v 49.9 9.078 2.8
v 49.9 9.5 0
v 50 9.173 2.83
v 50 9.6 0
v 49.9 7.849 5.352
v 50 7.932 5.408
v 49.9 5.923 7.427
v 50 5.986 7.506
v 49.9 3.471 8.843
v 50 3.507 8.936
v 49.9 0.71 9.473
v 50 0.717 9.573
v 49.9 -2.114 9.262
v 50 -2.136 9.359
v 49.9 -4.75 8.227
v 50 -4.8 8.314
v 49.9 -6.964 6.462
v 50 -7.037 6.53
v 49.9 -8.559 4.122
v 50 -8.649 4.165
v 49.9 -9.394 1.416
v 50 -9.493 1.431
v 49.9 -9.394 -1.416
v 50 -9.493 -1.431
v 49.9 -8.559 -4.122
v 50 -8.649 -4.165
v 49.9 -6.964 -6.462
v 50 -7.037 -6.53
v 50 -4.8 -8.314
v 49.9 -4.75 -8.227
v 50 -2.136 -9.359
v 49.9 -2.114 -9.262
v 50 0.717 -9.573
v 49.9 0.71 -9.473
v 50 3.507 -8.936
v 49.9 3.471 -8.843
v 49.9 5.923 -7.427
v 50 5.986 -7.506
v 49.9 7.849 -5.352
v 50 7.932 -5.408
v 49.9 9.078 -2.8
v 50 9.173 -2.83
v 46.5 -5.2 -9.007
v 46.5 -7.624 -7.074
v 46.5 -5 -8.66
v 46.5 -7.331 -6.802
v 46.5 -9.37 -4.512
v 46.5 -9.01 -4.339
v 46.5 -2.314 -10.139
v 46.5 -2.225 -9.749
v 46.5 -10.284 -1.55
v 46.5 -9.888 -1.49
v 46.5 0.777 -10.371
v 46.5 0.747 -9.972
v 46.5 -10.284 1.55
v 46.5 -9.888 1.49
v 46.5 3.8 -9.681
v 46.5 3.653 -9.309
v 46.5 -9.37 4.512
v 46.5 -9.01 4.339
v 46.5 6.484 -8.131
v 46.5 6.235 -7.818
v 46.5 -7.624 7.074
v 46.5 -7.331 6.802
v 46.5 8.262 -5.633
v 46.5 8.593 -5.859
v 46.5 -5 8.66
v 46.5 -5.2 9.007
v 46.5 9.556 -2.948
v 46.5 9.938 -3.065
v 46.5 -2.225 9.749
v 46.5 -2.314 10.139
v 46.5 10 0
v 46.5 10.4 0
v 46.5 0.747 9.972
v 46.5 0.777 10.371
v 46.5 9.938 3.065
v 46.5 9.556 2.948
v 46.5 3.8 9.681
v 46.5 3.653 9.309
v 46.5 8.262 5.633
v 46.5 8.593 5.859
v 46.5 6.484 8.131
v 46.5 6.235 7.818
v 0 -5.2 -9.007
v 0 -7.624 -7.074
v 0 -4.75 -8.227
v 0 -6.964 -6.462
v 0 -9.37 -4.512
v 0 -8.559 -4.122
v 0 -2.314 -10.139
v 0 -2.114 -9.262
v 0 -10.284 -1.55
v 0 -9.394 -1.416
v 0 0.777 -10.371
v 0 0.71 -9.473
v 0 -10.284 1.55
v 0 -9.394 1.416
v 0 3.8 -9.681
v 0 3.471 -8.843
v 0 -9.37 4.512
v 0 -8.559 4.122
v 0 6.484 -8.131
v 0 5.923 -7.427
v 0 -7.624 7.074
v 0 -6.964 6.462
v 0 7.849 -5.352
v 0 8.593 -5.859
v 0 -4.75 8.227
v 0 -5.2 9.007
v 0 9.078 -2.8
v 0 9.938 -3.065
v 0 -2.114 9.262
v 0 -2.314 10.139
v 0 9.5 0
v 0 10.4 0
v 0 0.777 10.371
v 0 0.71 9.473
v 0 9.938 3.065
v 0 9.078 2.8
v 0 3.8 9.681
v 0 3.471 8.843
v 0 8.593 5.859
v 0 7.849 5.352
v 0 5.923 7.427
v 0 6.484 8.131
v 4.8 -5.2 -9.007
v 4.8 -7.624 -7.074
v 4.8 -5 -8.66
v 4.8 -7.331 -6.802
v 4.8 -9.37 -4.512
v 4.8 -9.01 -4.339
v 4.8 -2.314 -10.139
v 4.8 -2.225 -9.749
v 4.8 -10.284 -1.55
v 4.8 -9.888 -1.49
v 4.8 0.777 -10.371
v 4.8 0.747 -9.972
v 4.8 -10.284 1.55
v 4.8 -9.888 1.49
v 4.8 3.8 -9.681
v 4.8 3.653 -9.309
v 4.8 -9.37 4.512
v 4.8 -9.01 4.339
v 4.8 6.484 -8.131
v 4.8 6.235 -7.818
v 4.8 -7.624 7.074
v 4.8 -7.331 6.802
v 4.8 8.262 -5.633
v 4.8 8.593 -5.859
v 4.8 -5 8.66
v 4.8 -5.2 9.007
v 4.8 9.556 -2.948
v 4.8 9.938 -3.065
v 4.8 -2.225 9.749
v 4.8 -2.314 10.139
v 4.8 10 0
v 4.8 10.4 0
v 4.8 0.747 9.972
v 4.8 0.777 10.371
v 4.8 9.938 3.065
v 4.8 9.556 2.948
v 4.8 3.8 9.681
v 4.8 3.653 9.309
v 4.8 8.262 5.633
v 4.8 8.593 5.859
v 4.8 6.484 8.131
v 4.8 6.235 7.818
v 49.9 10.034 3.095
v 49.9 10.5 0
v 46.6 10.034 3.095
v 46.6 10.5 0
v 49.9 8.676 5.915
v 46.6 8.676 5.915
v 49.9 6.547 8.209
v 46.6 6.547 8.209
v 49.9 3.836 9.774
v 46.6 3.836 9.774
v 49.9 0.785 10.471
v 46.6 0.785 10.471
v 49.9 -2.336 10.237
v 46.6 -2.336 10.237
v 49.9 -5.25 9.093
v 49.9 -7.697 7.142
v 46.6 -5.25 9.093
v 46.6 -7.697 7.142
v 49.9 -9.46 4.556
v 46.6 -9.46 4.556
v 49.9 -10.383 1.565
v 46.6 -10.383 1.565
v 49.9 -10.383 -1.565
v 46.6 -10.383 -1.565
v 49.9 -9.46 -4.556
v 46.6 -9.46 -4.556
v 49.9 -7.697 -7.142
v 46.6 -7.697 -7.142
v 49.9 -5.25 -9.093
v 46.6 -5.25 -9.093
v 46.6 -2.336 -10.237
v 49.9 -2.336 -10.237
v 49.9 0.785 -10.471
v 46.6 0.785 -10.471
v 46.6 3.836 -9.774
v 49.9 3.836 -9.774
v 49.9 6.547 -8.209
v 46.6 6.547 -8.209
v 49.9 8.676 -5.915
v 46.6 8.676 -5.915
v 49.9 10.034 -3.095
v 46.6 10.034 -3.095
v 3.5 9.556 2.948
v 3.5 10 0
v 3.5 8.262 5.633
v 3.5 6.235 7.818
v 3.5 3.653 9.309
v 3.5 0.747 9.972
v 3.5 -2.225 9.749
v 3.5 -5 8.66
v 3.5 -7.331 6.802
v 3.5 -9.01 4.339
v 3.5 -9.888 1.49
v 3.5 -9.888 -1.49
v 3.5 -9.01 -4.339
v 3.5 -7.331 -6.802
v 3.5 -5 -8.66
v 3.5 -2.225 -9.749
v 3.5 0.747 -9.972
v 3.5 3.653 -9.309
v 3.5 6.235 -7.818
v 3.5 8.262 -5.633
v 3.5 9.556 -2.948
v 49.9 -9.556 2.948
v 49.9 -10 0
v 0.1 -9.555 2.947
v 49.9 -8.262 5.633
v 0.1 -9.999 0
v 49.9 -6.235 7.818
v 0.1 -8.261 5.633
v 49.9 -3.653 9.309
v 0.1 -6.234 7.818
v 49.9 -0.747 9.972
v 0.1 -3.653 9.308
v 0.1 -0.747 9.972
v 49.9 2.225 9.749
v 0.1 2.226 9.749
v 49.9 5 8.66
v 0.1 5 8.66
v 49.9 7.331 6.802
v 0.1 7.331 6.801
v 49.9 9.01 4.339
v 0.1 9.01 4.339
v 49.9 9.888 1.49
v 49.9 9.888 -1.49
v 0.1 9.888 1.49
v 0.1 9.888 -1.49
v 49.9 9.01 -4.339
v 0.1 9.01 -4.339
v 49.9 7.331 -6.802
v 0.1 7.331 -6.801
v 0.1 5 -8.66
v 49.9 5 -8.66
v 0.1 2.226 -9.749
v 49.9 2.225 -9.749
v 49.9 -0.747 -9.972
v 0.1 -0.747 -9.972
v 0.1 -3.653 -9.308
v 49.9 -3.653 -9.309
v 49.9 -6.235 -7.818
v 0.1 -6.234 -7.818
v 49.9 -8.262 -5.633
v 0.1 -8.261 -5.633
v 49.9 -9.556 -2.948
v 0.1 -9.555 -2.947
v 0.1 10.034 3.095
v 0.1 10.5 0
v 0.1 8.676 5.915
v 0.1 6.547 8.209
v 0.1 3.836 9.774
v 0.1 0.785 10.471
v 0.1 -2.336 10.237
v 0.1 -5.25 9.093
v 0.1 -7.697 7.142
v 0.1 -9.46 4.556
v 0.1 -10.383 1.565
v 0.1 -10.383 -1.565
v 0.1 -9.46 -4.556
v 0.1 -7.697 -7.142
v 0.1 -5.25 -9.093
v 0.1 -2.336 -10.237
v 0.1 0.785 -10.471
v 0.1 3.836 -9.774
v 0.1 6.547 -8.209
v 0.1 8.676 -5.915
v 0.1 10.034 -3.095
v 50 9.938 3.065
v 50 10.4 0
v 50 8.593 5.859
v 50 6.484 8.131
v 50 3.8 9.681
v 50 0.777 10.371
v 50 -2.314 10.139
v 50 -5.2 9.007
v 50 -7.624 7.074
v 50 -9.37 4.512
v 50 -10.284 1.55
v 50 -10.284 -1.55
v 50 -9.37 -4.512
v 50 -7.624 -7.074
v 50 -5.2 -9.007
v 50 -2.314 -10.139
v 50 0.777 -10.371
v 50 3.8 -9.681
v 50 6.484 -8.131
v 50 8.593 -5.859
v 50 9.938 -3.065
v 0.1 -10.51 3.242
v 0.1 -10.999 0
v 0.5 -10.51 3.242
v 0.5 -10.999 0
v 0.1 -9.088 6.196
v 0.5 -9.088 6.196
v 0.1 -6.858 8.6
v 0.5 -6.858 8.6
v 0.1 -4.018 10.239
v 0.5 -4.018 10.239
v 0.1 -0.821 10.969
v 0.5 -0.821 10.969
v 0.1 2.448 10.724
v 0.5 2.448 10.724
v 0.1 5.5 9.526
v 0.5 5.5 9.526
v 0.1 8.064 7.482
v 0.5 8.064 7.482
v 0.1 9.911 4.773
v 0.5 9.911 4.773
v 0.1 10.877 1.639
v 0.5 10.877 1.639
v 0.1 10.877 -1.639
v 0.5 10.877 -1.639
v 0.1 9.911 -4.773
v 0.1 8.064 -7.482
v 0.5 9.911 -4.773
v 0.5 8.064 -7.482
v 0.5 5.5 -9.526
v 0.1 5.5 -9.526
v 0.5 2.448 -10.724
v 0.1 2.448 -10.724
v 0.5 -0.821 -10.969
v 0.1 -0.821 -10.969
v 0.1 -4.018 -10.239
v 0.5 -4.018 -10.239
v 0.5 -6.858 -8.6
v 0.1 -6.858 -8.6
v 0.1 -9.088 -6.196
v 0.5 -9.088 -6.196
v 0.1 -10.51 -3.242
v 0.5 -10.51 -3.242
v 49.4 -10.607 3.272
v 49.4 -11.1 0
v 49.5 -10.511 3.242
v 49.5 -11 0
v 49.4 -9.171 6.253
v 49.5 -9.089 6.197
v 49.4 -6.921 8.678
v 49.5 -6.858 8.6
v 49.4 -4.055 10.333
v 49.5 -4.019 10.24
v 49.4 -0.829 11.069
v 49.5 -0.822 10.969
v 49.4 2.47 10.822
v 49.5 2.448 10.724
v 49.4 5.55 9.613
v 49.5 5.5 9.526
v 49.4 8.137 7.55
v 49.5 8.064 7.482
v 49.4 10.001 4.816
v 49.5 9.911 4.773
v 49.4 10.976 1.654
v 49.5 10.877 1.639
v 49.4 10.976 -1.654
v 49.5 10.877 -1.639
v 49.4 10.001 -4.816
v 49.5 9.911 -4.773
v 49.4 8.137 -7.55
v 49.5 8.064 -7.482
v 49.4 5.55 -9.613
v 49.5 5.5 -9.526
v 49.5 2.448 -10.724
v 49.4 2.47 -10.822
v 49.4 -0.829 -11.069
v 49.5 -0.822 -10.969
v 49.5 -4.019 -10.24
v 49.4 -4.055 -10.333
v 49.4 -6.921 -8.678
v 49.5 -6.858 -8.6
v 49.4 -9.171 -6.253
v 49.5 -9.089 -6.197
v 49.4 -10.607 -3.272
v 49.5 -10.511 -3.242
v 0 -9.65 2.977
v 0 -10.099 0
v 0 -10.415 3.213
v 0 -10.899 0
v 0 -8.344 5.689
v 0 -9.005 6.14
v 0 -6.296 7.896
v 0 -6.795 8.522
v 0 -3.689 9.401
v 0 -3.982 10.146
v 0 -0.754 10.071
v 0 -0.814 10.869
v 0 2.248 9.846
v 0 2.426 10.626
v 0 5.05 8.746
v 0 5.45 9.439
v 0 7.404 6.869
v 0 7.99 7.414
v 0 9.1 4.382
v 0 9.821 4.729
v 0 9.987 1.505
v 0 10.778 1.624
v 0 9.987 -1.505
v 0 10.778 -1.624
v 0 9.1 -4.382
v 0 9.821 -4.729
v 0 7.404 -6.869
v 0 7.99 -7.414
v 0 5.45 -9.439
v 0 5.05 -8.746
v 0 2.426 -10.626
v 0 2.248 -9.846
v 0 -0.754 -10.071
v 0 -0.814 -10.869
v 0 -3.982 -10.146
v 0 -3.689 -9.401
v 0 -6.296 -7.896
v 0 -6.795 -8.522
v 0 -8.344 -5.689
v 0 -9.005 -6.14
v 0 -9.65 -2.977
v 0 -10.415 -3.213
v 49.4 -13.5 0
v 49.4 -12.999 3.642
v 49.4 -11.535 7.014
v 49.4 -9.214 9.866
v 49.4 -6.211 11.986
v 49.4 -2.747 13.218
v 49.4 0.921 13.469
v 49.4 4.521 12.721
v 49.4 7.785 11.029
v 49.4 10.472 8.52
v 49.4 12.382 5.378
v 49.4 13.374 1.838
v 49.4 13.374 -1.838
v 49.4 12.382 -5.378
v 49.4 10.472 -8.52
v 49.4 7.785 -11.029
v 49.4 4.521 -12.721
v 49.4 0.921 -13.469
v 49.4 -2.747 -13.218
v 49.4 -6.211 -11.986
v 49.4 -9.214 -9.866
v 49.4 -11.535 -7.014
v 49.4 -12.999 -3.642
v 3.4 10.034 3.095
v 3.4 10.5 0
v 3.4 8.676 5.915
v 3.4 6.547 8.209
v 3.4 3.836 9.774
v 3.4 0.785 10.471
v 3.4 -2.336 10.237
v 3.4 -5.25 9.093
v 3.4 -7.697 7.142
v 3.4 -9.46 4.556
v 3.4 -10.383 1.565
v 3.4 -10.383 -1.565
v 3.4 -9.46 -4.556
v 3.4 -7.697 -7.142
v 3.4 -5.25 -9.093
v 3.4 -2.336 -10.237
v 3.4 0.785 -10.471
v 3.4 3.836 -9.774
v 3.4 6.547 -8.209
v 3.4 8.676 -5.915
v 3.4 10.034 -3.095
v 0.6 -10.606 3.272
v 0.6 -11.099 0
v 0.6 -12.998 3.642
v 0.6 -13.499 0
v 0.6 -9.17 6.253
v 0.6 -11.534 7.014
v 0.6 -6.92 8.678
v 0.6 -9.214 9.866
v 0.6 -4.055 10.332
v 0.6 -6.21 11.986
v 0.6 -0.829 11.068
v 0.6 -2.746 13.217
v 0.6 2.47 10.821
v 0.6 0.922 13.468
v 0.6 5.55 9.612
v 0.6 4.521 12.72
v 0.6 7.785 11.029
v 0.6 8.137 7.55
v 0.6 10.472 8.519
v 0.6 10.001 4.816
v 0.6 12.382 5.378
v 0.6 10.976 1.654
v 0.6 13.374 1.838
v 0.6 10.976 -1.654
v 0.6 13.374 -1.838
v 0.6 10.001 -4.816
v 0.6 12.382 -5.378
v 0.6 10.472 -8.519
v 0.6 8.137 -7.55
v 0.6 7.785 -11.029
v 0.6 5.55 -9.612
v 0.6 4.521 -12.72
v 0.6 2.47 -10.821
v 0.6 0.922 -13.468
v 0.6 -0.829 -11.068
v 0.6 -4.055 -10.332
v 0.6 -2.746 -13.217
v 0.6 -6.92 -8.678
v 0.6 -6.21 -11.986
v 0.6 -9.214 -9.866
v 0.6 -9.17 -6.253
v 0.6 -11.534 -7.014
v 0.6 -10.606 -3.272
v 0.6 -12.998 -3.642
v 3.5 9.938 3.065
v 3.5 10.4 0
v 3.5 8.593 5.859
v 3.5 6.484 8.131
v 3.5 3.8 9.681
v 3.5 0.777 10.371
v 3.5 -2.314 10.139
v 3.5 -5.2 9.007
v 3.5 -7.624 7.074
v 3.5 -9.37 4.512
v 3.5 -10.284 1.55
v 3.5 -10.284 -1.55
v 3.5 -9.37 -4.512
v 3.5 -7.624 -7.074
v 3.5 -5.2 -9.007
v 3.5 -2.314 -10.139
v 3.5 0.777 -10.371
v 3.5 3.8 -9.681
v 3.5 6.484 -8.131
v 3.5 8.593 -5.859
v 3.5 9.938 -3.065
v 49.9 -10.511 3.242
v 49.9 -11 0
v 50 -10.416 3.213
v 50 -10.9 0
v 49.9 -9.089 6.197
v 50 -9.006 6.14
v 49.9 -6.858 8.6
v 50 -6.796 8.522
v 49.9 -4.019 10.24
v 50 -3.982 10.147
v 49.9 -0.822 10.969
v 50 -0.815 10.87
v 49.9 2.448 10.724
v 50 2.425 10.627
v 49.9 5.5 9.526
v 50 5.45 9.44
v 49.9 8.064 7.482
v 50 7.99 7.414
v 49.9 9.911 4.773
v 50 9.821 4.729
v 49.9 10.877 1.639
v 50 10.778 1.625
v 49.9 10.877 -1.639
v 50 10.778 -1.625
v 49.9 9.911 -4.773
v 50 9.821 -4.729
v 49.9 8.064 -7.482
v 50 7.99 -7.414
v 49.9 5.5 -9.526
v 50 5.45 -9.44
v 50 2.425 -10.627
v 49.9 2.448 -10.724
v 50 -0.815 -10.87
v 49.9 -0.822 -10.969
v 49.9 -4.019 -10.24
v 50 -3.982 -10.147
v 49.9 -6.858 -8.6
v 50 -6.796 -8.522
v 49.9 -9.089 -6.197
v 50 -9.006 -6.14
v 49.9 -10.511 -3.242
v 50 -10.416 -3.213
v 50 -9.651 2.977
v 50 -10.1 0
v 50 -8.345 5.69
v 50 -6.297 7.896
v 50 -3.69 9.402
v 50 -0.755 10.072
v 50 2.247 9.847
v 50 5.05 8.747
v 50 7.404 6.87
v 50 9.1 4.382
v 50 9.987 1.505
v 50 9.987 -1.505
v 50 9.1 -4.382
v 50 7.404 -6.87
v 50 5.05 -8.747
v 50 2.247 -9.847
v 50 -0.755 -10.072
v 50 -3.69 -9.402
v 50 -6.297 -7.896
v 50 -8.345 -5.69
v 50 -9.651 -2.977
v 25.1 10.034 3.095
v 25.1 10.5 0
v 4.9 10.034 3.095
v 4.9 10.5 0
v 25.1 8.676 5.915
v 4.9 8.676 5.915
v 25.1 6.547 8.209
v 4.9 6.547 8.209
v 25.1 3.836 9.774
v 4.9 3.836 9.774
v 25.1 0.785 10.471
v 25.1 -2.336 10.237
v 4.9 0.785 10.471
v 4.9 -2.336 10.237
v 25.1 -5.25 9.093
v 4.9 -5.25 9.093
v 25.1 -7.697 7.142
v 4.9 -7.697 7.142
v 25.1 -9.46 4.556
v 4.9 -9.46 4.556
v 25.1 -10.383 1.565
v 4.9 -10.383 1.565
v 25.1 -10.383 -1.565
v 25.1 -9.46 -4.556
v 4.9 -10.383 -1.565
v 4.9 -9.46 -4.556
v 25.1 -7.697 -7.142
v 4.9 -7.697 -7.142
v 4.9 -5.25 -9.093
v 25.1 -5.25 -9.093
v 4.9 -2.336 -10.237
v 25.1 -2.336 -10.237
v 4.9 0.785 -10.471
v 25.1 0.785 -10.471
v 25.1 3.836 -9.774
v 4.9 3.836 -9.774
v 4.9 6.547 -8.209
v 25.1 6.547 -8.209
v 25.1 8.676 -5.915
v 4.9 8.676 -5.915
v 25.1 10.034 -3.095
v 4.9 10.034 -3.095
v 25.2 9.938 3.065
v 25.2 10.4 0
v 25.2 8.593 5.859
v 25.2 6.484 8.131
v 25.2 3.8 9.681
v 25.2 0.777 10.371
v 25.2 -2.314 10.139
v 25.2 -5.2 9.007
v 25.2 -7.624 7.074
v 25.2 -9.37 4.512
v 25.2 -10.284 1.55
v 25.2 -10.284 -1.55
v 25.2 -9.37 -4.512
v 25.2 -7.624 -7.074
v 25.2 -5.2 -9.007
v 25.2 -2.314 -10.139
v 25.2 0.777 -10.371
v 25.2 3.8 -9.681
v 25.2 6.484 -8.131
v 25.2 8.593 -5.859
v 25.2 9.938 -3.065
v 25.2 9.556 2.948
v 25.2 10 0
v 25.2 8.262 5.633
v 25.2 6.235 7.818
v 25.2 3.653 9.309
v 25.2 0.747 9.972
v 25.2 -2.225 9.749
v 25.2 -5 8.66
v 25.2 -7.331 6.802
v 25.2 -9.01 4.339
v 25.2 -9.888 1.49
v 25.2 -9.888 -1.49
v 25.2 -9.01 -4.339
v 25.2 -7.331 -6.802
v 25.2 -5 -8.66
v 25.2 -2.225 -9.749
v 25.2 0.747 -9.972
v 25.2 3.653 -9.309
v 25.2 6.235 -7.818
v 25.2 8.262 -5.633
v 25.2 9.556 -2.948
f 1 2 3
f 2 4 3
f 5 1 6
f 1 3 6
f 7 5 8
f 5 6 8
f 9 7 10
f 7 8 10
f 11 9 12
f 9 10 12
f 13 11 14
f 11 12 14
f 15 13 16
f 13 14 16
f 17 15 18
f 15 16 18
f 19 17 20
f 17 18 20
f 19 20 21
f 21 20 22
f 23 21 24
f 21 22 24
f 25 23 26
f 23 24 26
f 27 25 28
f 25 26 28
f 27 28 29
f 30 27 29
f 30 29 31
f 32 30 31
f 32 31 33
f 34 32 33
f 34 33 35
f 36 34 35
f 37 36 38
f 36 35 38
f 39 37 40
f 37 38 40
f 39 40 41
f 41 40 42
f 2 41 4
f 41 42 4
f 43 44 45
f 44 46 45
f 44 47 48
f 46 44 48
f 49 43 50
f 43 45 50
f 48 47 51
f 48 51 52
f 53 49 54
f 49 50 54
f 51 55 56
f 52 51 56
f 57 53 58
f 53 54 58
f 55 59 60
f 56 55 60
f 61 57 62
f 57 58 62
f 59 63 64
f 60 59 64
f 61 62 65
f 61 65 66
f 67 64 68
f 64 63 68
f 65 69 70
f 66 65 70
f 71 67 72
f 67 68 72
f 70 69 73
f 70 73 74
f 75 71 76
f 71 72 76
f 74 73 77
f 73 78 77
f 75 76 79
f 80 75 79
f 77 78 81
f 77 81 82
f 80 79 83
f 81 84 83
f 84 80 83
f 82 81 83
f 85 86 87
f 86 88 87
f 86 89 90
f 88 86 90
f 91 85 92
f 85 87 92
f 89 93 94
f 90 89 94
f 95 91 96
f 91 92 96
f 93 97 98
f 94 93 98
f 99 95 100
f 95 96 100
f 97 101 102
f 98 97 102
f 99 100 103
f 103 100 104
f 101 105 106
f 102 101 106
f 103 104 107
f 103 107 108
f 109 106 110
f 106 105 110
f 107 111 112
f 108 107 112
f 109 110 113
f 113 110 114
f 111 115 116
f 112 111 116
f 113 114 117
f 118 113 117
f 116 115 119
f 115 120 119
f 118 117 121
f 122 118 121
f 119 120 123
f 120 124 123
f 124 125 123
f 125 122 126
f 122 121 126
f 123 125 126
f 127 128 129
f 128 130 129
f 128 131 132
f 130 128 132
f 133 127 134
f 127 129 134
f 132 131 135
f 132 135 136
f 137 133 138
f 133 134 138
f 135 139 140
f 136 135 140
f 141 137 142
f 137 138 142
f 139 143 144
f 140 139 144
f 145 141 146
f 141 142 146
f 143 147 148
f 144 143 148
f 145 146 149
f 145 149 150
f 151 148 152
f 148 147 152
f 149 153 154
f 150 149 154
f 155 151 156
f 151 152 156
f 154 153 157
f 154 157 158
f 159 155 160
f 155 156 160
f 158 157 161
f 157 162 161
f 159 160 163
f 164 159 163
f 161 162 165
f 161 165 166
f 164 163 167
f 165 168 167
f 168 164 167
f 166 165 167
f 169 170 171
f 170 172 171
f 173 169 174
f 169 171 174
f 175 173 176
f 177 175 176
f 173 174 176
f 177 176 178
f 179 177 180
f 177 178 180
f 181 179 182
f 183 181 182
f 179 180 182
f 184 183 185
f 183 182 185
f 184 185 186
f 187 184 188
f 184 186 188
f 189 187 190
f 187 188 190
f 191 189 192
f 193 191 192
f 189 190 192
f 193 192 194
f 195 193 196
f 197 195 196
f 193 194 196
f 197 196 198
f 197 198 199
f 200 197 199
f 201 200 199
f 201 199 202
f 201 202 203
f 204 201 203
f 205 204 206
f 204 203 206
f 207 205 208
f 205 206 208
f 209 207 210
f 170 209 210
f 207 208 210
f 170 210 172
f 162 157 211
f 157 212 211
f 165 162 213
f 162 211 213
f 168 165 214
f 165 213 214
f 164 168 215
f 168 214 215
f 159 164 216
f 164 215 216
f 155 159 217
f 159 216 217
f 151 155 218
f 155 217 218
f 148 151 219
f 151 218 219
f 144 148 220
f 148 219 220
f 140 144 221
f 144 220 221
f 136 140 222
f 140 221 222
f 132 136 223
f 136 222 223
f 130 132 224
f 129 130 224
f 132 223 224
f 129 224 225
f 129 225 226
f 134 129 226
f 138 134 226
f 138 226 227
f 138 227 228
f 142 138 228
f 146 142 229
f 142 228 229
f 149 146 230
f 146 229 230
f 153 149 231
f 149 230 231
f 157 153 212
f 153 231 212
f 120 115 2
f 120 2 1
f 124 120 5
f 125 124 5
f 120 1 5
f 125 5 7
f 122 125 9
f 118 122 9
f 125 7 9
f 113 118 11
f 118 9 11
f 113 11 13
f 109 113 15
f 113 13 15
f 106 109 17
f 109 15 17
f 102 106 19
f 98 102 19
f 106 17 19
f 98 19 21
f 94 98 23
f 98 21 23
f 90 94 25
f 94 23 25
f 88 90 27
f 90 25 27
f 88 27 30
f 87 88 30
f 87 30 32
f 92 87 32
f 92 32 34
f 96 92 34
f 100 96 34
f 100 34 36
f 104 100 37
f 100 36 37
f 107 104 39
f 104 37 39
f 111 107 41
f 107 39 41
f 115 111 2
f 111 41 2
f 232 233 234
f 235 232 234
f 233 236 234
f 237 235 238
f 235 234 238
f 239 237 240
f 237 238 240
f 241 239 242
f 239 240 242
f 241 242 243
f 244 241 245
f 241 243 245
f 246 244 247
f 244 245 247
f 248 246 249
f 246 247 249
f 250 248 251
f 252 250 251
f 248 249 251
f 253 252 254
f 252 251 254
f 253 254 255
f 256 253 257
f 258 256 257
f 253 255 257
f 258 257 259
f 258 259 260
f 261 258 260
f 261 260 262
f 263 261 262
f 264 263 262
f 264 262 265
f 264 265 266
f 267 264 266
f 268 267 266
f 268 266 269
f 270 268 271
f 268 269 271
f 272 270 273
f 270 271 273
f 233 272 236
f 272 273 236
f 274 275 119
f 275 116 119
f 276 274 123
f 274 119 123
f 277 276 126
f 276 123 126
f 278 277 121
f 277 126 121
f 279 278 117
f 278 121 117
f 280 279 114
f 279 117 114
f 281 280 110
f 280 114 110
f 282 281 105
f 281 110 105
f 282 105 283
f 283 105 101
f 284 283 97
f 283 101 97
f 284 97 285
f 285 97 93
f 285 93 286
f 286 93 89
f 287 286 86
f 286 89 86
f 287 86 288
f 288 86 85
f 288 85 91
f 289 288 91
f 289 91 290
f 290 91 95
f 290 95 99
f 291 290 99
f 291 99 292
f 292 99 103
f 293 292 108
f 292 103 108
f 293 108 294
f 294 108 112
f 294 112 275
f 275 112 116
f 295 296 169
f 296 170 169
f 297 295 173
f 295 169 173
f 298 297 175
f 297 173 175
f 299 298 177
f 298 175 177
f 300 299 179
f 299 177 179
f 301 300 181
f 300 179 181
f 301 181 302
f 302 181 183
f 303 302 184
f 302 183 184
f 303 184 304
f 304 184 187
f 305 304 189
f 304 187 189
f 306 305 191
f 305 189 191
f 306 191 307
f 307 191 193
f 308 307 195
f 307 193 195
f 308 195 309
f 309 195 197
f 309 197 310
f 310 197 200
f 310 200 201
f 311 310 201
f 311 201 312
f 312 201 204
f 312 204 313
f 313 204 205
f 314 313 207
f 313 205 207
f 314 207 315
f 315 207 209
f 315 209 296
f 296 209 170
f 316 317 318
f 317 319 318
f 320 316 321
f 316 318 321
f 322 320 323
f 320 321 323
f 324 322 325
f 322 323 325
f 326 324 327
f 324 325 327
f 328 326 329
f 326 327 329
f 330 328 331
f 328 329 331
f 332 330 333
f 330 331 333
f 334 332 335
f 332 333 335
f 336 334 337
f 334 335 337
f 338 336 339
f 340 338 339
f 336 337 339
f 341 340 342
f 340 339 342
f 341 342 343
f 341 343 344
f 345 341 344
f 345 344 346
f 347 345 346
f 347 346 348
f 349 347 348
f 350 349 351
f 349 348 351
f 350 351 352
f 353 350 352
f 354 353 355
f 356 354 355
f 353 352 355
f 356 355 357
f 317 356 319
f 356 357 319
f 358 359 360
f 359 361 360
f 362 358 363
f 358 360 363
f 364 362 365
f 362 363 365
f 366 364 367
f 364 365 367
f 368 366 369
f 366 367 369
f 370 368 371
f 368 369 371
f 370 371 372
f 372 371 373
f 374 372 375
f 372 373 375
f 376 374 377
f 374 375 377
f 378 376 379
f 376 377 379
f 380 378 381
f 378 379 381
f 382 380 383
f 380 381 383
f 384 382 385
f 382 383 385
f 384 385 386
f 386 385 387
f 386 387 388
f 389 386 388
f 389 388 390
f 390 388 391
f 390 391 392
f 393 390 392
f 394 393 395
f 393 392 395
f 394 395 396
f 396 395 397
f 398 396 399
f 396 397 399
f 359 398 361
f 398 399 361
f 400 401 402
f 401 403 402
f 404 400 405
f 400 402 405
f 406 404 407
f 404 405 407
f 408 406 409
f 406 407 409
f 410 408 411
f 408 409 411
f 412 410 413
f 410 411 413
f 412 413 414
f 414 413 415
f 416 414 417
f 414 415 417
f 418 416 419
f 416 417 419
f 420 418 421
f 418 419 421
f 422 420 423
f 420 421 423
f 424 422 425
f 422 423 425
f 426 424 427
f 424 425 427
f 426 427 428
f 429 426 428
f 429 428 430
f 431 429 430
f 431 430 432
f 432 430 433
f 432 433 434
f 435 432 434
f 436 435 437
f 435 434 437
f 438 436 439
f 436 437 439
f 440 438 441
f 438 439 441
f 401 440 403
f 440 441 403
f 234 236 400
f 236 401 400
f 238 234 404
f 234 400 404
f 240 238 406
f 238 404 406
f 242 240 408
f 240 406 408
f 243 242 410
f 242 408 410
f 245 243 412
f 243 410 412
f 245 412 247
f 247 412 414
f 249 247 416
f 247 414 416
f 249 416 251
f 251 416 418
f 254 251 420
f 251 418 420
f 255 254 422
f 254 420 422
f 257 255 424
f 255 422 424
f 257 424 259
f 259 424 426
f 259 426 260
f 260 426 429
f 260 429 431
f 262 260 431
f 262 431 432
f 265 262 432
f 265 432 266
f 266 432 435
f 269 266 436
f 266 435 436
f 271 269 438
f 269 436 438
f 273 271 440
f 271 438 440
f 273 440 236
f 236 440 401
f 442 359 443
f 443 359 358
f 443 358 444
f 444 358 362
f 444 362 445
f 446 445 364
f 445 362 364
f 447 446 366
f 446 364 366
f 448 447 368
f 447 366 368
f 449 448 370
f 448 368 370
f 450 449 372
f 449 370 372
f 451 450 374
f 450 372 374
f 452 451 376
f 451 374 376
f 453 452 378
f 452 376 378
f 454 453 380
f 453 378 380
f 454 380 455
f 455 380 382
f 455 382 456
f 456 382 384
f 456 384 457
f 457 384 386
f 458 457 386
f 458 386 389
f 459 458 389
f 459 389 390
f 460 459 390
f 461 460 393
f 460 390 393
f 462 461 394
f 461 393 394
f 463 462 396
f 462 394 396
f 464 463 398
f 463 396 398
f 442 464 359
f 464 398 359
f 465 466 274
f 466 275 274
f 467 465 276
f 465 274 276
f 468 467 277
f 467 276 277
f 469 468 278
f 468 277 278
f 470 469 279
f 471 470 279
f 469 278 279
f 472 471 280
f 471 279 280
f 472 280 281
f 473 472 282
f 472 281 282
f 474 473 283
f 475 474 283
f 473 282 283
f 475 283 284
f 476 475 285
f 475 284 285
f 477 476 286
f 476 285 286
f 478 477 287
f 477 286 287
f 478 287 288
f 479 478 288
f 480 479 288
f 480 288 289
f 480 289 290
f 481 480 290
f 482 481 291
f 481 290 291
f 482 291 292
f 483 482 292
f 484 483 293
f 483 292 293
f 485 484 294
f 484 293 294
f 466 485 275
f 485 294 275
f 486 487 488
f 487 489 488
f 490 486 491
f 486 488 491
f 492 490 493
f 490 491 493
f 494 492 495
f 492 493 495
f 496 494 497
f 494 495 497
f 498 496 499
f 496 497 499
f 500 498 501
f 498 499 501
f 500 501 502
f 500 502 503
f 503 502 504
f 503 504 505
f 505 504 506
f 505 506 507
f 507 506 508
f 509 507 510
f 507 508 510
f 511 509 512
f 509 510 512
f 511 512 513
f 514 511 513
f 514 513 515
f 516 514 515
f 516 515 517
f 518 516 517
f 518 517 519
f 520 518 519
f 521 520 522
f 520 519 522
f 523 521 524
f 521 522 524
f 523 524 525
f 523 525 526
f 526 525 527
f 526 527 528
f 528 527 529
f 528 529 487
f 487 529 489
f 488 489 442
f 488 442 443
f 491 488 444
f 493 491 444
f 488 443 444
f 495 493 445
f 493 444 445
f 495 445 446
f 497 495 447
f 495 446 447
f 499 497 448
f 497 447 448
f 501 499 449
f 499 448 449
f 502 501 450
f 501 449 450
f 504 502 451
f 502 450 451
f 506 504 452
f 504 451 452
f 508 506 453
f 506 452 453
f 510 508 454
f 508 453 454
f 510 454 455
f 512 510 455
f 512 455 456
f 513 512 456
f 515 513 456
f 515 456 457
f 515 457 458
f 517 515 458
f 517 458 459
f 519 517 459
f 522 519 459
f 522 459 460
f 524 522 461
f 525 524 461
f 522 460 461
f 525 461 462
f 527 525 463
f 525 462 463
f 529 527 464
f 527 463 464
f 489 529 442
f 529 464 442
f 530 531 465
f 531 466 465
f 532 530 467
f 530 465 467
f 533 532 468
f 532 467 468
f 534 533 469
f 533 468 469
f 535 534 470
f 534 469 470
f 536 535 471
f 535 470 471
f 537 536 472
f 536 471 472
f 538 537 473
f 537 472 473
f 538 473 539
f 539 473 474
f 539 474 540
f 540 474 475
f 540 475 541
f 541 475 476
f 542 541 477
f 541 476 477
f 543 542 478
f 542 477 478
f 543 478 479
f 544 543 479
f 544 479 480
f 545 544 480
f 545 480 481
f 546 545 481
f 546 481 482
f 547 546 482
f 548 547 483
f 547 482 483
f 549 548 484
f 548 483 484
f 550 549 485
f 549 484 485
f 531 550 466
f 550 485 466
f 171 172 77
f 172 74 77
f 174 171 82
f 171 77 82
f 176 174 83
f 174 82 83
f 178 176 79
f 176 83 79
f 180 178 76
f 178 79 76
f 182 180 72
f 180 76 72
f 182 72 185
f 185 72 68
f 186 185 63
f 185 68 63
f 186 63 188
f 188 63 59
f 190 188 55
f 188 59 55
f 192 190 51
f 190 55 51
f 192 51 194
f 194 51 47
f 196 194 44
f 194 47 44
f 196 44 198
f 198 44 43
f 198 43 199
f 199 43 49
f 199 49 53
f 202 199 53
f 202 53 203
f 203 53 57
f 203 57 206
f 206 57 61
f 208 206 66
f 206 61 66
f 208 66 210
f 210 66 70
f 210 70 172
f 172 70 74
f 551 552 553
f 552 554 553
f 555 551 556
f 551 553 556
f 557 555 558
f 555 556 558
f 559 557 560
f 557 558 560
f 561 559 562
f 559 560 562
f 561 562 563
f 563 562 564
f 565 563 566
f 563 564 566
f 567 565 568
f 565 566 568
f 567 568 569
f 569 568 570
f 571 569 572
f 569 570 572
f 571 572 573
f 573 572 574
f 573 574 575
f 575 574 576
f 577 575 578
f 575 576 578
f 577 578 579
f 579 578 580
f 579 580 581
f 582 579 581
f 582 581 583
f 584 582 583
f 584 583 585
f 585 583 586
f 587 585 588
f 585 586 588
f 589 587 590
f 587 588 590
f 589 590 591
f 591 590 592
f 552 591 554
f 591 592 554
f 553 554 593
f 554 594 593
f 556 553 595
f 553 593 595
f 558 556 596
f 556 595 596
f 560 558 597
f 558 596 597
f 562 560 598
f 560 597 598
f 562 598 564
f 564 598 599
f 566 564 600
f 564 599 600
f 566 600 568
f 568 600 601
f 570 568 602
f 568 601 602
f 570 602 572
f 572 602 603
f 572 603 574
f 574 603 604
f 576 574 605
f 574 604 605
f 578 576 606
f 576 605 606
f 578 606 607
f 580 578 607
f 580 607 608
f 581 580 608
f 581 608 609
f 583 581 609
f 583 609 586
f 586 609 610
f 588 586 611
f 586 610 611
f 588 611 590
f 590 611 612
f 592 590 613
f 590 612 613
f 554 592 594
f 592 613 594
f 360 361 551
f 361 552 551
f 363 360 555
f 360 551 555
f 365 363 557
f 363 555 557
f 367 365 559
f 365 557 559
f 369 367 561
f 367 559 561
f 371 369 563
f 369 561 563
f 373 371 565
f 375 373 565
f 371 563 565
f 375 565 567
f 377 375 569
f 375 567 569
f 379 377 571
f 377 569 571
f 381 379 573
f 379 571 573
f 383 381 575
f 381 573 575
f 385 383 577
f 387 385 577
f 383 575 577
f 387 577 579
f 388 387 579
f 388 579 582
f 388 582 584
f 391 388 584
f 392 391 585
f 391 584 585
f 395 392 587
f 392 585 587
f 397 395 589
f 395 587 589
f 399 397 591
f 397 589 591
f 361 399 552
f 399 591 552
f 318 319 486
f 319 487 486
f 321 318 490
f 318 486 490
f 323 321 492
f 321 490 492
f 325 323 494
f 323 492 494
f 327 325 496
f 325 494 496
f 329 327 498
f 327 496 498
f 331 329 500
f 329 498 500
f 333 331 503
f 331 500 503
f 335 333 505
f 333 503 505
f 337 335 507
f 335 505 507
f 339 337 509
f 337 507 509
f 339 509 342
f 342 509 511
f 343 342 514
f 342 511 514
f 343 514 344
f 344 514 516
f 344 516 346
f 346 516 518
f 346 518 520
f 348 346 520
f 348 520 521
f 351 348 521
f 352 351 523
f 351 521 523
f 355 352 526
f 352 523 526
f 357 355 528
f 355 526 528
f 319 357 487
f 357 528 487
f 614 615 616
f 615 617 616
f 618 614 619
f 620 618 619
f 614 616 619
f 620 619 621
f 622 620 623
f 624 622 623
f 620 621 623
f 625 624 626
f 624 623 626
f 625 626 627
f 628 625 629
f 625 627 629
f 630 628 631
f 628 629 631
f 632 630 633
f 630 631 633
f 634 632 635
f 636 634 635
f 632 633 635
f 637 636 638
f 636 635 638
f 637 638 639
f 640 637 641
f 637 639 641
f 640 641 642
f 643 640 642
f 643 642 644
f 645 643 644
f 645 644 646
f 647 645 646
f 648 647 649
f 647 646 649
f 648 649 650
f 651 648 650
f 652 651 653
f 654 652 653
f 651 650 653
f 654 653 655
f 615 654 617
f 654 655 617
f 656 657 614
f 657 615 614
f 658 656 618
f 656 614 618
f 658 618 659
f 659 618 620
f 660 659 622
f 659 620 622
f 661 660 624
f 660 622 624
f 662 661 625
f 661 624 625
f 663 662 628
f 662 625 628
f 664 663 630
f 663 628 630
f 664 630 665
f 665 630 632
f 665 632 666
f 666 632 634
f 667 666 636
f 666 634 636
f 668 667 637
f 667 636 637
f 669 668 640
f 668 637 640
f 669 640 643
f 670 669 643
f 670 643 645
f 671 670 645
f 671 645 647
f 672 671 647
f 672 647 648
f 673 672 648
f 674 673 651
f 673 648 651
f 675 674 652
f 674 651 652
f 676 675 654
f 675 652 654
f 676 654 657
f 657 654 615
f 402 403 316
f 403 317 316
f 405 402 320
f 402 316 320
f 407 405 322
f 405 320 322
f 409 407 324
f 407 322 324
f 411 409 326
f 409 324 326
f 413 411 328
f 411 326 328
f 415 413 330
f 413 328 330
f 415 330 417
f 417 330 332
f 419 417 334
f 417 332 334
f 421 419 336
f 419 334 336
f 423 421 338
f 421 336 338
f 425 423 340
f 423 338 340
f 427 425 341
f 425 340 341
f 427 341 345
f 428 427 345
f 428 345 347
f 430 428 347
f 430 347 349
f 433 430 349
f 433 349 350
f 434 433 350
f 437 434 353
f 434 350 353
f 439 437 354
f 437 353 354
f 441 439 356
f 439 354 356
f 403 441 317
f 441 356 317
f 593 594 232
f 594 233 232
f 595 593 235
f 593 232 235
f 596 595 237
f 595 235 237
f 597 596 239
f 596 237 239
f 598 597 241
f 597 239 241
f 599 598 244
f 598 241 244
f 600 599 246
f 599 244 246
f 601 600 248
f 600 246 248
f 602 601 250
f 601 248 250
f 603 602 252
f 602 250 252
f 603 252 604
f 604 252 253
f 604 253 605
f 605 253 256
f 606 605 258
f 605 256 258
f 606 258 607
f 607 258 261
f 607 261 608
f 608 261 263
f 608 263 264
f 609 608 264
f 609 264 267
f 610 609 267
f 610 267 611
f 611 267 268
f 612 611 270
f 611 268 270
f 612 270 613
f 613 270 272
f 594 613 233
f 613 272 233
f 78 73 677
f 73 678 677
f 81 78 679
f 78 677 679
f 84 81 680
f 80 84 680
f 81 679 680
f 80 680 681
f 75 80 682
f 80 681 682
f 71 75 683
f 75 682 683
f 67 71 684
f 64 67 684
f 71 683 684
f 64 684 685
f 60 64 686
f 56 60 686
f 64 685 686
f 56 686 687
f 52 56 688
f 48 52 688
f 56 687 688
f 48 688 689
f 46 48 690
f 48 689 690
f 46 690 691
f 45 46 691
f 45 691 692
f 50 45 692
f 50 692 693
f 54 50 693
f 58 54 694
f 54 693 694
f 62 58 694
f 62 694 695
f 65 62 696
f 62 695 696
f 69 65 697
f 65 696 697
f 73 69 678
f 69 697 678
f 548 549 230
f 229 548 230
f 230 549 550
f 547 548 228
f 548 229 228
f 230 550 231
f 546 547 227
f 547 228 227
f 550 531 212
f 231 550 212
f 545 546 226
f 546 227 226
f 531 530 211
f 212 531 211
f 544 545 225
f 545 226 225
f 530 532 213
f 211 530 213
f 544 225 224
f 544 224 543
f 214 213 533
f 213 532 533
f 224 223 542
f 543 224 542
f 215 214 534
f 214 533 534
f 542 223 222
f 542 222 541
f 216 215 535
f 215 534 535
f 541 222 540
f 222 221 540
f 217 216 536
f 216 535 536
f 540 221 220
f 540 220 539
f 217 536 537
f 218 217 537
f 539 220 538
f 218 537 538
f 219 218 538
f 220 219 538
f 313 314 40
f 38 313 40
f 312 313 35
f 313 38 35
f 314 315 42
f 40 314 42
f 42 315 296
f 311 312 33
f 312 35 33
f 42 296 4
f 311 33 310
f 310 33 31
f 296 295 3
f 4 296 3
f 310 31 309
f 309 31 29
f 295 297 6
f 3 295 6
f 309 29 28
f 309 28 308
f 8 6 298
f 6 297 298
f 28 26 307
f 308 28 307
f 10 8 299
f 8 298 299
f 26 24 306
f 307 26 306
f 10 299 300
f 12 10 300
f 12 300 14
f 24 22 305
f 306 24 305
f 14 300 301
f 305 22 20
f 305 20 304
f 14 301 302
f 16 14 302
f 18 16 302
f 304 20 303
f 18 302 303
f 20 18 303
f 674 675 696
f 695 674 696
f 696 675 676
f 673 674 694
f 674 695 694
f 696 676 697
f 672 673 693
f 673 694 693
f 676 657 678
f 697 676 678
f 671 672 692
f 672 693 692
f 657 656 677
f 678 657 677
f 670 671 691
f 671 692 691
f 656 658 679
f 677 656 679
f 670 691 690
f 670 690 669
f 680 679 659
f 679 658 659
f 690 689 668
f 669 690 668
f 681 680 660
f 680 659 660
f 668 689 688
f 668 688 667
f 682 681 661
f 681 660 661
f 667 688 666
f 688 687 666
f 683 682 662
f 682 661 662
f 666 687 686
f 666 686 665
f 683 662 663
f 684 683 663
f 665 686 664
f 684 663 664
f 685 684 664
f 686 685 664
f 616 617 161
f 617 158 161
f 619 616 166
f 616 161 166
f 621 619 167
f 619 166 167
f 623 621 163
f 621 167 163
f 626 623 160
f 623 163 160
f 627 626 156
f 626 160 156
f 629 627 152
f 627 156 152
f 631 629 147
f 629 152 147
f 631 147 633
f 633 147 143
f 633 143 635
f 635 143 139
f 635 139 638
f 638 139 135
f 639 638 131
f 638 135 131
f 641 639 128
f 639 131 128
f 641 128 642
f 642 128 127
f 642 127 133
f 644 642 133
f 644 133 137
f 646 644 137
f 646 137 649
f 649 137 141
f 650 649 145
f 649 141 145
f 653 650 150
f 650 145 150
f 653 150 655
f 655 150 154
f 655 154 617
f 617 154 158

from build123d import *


with BuildPart() as part:
    # Эскиз3 → Повернуть2 (revolve)
    with BuildSketch(Plane.XY):
        Polygon((25.2, 10.4), (25.1, 10.5), (4.9, 10.5), (4.8, 10.4), (4.8, 10), (3.5, 10), (3.5, 10.4), (3.4, 10.5), (0.1, 10.5), (0, 10.4), (0, 9.5), (49.9, 9.5), (50, 9.6), (50, 10.4), (49.9, 10.5), (46.6, 10.5), (46.5, 10.4), (46.5, 10), (25.2, 10), align=None)
    revolve(axis=Axis((0, 0, 0), (1, 0, 0)))


with BuildPart() as body_2:
    # Эскиз7 → Повернуть3 (revolve)
    with BuildSketch(Plane.XY, mode=Mode.PRIVATE) as revolve_3_sk:
        Polygon((0, 10.1), (0, 10.9), (0.1, 11), (0.5, 11), (0.6, 11.1), (0.6, 13.5), (49.4, 13.5), (49.4, 11.1), (49.5, 11), (49.9, 11), (50, 10.9), (50, 10.1), (49.9, 10), (0.1, 10), align=None)
    revolve(revolve_3_sk.sketch.rotate(Axis((50.760752351, 0, 0), (-0.9999999999514948, 9.849390109362252e-06, 0)), 180), axis=Axis((50.760752351, 0, 0), (-0.9999999999514948, 9.849390109362252e-06, 0)))


solid = Compound([part.part, body_2.part])
